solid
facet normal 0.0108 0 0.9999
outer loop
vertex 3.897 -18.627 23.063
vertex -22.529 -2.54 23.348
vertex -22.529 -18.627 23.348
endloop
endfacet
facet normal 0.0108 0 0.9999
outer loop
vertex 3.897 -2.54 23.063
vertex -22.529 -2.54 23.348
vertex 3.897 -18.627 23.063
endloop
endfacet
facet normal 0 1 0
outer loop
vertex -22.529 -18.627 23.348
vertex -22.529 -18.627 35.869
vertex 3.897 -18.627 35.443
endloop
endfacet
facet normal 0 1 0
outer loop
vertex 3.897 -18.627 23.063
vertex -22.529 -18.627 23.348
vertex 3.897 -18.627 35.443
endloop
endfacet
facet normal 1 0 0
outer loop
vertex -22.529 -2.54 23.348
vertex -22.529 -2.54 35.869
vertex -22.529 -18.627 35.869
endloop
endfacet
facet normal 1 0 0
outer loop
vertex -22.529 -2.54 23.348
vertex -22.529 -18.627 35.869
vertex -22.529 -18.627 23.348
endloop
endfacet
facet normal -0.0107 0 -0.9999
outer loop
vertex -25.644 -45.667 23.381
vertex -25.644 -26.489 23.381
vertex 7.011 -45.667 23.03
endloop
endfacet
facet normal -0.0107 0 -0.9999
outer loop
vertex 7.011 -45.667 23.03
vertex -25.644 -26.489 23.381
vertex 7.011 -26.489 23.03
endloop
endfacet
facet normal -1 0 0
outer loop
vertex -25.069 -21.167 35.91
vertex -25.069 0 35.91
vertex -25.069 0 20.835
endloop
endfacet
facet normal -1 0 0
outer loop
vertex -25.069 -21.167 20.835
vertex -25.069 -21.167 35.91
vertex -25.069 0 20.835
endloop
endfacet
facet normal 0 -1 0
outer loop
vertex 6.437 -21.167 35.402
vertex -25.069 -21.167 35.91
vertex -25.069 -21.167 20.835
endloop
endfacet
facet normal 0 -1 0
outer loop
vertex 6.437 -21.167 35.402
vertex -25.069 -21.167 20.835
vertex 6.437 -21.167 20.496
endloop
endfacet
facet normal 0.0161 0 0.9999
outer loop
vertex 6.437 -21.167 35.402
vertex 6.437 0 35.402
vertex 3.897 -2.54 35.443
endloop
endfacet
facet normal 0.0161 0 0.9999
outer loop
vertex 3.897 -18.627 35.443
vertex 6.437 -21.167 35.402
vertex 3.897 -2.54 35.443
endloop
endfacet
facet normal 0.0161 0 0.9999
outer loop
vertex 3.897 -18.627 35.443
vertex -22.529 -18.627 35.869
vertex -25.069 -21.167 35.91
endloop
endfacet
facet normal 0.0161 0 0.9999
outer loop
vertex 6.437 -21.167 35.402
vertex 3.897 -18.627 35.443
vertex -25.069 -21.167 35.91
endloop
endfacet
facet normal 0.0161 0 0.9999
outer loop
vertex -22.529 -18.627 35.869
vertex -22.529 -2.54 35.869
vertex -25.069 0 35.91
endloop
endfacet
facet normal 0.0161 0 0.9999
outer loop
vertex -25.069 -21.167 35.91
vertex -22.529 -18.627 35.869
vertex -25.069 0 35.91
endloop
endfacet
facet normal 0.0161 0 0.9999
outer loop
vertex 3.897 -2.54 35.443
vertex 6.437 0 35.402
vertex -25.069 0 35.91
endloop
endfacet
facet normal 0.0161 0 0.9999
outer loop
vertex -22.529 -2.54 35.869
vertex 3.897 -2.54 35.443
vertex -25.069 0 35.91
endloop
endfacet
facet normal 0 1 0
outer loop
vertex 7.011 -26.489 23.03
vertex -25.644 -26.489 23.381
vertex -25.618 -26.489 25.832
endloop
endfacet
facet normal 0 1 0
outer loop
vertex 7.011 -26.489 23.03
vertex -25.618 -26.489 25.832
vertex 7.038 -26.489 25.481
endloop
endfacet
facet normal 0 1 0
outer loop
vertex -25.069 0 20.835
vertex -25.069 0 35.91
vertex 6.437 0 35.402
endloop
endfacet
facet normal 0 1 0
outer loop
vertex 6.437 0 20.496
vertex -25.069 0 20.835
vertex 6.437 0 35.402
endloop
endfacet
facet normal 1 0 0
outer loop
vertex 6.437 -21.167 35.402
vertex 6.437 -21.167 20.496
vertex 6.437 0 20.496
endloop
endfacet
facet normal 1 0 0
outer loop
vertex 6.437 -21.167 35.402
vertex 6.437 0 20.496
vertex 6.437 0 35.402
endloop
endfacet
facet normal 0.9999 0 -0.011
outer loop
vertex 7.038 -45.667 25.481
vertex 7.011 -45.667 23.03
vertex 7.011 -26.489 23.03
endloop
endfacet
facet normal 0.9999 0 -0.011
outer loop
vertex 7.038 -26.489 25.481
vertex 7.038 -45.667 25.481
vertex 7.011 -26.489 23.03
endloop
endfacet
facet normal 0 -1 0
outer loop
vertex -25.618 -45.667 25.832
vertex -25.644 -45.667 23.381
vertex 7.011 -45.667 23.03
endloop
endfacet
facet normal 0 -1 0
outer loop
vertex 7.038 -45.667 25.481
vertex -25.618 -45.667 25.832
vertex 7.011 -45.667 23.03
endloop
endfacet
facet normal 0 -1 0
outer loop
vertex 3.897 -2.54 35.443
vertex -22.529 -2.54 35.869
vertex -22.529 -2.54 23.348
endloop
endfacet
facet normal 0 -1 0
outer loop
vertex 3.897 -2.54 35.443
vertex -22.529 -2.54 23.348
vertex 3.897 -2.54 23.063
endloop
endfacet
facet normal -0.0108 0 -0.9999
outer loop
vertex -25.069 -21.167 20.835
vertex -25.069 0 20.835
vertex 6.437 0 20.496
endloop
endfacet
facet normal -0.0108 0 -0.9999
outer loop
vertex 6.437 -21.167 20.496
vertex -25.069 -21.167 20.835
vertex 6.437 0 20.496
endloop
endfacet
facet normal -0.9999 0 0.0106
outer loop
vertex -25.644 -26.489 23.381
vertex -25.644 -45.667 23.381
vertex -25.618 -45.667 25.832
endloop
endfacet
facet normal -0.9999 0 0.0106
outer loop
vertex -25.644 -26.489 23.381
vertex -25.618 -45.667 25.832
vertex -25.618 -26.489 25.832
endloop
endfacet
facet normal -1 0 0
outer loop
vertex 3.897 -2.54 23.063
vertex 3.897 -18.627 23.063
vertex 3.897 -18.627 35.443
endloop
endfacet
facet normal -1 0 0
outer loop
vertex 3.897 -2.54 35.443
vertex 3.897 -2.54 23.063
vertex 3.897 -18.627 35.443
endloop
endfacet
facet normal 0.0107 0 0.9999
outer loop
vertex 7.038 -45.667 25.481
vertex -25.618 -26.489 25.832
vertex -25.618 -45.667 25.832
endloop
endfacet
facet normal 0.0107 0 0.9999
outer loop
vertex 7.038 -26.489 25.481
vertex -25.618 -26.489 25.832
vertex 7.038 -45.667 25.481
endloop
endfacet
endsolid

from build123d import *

# Parameters (mm, degrees)
F1_DEPTH = 21.16737
F2_T     = -2.54
F3_W     = 32.657153
F3_H     = 19.177892
F4_DEPTH = 2.451424


with BuildPart() as f1:
    # F0 (on Front) → F1 (new body)
    with BuildSketch(Plane.XZ):
        Polygon((6.436735, 20.495936), (6.436735, 35.402082), (-25.069445, 35.910249), (-25.069445, 20.834714), align=None)
    extrude(amount=F1_DEPTH)

    # F2
    f2_openings = [f1.faces().sort_by_distance(p)[0] for p in [
        (-9.316355, -10.583685, 35.656165),
    ]]
    offset(amount=F2_T, openings=f2_openings)


with BuildPart() as f4:
    # F3 (on face) → F4 (new body)
    with BuildSketch(Plane(origin=(0.248417, 0, 23.102625), x_dir=(0.999942, 0, -0.010752), z_dir=(0.010752, 0, 0.999942))):
        with Locations((-9.565324, -36.078006)):
            Rectangle(F3_W, F3_H)
    extrude(amount=F4_DEPTH)


solid = Compound([f1.part, f4.part])
